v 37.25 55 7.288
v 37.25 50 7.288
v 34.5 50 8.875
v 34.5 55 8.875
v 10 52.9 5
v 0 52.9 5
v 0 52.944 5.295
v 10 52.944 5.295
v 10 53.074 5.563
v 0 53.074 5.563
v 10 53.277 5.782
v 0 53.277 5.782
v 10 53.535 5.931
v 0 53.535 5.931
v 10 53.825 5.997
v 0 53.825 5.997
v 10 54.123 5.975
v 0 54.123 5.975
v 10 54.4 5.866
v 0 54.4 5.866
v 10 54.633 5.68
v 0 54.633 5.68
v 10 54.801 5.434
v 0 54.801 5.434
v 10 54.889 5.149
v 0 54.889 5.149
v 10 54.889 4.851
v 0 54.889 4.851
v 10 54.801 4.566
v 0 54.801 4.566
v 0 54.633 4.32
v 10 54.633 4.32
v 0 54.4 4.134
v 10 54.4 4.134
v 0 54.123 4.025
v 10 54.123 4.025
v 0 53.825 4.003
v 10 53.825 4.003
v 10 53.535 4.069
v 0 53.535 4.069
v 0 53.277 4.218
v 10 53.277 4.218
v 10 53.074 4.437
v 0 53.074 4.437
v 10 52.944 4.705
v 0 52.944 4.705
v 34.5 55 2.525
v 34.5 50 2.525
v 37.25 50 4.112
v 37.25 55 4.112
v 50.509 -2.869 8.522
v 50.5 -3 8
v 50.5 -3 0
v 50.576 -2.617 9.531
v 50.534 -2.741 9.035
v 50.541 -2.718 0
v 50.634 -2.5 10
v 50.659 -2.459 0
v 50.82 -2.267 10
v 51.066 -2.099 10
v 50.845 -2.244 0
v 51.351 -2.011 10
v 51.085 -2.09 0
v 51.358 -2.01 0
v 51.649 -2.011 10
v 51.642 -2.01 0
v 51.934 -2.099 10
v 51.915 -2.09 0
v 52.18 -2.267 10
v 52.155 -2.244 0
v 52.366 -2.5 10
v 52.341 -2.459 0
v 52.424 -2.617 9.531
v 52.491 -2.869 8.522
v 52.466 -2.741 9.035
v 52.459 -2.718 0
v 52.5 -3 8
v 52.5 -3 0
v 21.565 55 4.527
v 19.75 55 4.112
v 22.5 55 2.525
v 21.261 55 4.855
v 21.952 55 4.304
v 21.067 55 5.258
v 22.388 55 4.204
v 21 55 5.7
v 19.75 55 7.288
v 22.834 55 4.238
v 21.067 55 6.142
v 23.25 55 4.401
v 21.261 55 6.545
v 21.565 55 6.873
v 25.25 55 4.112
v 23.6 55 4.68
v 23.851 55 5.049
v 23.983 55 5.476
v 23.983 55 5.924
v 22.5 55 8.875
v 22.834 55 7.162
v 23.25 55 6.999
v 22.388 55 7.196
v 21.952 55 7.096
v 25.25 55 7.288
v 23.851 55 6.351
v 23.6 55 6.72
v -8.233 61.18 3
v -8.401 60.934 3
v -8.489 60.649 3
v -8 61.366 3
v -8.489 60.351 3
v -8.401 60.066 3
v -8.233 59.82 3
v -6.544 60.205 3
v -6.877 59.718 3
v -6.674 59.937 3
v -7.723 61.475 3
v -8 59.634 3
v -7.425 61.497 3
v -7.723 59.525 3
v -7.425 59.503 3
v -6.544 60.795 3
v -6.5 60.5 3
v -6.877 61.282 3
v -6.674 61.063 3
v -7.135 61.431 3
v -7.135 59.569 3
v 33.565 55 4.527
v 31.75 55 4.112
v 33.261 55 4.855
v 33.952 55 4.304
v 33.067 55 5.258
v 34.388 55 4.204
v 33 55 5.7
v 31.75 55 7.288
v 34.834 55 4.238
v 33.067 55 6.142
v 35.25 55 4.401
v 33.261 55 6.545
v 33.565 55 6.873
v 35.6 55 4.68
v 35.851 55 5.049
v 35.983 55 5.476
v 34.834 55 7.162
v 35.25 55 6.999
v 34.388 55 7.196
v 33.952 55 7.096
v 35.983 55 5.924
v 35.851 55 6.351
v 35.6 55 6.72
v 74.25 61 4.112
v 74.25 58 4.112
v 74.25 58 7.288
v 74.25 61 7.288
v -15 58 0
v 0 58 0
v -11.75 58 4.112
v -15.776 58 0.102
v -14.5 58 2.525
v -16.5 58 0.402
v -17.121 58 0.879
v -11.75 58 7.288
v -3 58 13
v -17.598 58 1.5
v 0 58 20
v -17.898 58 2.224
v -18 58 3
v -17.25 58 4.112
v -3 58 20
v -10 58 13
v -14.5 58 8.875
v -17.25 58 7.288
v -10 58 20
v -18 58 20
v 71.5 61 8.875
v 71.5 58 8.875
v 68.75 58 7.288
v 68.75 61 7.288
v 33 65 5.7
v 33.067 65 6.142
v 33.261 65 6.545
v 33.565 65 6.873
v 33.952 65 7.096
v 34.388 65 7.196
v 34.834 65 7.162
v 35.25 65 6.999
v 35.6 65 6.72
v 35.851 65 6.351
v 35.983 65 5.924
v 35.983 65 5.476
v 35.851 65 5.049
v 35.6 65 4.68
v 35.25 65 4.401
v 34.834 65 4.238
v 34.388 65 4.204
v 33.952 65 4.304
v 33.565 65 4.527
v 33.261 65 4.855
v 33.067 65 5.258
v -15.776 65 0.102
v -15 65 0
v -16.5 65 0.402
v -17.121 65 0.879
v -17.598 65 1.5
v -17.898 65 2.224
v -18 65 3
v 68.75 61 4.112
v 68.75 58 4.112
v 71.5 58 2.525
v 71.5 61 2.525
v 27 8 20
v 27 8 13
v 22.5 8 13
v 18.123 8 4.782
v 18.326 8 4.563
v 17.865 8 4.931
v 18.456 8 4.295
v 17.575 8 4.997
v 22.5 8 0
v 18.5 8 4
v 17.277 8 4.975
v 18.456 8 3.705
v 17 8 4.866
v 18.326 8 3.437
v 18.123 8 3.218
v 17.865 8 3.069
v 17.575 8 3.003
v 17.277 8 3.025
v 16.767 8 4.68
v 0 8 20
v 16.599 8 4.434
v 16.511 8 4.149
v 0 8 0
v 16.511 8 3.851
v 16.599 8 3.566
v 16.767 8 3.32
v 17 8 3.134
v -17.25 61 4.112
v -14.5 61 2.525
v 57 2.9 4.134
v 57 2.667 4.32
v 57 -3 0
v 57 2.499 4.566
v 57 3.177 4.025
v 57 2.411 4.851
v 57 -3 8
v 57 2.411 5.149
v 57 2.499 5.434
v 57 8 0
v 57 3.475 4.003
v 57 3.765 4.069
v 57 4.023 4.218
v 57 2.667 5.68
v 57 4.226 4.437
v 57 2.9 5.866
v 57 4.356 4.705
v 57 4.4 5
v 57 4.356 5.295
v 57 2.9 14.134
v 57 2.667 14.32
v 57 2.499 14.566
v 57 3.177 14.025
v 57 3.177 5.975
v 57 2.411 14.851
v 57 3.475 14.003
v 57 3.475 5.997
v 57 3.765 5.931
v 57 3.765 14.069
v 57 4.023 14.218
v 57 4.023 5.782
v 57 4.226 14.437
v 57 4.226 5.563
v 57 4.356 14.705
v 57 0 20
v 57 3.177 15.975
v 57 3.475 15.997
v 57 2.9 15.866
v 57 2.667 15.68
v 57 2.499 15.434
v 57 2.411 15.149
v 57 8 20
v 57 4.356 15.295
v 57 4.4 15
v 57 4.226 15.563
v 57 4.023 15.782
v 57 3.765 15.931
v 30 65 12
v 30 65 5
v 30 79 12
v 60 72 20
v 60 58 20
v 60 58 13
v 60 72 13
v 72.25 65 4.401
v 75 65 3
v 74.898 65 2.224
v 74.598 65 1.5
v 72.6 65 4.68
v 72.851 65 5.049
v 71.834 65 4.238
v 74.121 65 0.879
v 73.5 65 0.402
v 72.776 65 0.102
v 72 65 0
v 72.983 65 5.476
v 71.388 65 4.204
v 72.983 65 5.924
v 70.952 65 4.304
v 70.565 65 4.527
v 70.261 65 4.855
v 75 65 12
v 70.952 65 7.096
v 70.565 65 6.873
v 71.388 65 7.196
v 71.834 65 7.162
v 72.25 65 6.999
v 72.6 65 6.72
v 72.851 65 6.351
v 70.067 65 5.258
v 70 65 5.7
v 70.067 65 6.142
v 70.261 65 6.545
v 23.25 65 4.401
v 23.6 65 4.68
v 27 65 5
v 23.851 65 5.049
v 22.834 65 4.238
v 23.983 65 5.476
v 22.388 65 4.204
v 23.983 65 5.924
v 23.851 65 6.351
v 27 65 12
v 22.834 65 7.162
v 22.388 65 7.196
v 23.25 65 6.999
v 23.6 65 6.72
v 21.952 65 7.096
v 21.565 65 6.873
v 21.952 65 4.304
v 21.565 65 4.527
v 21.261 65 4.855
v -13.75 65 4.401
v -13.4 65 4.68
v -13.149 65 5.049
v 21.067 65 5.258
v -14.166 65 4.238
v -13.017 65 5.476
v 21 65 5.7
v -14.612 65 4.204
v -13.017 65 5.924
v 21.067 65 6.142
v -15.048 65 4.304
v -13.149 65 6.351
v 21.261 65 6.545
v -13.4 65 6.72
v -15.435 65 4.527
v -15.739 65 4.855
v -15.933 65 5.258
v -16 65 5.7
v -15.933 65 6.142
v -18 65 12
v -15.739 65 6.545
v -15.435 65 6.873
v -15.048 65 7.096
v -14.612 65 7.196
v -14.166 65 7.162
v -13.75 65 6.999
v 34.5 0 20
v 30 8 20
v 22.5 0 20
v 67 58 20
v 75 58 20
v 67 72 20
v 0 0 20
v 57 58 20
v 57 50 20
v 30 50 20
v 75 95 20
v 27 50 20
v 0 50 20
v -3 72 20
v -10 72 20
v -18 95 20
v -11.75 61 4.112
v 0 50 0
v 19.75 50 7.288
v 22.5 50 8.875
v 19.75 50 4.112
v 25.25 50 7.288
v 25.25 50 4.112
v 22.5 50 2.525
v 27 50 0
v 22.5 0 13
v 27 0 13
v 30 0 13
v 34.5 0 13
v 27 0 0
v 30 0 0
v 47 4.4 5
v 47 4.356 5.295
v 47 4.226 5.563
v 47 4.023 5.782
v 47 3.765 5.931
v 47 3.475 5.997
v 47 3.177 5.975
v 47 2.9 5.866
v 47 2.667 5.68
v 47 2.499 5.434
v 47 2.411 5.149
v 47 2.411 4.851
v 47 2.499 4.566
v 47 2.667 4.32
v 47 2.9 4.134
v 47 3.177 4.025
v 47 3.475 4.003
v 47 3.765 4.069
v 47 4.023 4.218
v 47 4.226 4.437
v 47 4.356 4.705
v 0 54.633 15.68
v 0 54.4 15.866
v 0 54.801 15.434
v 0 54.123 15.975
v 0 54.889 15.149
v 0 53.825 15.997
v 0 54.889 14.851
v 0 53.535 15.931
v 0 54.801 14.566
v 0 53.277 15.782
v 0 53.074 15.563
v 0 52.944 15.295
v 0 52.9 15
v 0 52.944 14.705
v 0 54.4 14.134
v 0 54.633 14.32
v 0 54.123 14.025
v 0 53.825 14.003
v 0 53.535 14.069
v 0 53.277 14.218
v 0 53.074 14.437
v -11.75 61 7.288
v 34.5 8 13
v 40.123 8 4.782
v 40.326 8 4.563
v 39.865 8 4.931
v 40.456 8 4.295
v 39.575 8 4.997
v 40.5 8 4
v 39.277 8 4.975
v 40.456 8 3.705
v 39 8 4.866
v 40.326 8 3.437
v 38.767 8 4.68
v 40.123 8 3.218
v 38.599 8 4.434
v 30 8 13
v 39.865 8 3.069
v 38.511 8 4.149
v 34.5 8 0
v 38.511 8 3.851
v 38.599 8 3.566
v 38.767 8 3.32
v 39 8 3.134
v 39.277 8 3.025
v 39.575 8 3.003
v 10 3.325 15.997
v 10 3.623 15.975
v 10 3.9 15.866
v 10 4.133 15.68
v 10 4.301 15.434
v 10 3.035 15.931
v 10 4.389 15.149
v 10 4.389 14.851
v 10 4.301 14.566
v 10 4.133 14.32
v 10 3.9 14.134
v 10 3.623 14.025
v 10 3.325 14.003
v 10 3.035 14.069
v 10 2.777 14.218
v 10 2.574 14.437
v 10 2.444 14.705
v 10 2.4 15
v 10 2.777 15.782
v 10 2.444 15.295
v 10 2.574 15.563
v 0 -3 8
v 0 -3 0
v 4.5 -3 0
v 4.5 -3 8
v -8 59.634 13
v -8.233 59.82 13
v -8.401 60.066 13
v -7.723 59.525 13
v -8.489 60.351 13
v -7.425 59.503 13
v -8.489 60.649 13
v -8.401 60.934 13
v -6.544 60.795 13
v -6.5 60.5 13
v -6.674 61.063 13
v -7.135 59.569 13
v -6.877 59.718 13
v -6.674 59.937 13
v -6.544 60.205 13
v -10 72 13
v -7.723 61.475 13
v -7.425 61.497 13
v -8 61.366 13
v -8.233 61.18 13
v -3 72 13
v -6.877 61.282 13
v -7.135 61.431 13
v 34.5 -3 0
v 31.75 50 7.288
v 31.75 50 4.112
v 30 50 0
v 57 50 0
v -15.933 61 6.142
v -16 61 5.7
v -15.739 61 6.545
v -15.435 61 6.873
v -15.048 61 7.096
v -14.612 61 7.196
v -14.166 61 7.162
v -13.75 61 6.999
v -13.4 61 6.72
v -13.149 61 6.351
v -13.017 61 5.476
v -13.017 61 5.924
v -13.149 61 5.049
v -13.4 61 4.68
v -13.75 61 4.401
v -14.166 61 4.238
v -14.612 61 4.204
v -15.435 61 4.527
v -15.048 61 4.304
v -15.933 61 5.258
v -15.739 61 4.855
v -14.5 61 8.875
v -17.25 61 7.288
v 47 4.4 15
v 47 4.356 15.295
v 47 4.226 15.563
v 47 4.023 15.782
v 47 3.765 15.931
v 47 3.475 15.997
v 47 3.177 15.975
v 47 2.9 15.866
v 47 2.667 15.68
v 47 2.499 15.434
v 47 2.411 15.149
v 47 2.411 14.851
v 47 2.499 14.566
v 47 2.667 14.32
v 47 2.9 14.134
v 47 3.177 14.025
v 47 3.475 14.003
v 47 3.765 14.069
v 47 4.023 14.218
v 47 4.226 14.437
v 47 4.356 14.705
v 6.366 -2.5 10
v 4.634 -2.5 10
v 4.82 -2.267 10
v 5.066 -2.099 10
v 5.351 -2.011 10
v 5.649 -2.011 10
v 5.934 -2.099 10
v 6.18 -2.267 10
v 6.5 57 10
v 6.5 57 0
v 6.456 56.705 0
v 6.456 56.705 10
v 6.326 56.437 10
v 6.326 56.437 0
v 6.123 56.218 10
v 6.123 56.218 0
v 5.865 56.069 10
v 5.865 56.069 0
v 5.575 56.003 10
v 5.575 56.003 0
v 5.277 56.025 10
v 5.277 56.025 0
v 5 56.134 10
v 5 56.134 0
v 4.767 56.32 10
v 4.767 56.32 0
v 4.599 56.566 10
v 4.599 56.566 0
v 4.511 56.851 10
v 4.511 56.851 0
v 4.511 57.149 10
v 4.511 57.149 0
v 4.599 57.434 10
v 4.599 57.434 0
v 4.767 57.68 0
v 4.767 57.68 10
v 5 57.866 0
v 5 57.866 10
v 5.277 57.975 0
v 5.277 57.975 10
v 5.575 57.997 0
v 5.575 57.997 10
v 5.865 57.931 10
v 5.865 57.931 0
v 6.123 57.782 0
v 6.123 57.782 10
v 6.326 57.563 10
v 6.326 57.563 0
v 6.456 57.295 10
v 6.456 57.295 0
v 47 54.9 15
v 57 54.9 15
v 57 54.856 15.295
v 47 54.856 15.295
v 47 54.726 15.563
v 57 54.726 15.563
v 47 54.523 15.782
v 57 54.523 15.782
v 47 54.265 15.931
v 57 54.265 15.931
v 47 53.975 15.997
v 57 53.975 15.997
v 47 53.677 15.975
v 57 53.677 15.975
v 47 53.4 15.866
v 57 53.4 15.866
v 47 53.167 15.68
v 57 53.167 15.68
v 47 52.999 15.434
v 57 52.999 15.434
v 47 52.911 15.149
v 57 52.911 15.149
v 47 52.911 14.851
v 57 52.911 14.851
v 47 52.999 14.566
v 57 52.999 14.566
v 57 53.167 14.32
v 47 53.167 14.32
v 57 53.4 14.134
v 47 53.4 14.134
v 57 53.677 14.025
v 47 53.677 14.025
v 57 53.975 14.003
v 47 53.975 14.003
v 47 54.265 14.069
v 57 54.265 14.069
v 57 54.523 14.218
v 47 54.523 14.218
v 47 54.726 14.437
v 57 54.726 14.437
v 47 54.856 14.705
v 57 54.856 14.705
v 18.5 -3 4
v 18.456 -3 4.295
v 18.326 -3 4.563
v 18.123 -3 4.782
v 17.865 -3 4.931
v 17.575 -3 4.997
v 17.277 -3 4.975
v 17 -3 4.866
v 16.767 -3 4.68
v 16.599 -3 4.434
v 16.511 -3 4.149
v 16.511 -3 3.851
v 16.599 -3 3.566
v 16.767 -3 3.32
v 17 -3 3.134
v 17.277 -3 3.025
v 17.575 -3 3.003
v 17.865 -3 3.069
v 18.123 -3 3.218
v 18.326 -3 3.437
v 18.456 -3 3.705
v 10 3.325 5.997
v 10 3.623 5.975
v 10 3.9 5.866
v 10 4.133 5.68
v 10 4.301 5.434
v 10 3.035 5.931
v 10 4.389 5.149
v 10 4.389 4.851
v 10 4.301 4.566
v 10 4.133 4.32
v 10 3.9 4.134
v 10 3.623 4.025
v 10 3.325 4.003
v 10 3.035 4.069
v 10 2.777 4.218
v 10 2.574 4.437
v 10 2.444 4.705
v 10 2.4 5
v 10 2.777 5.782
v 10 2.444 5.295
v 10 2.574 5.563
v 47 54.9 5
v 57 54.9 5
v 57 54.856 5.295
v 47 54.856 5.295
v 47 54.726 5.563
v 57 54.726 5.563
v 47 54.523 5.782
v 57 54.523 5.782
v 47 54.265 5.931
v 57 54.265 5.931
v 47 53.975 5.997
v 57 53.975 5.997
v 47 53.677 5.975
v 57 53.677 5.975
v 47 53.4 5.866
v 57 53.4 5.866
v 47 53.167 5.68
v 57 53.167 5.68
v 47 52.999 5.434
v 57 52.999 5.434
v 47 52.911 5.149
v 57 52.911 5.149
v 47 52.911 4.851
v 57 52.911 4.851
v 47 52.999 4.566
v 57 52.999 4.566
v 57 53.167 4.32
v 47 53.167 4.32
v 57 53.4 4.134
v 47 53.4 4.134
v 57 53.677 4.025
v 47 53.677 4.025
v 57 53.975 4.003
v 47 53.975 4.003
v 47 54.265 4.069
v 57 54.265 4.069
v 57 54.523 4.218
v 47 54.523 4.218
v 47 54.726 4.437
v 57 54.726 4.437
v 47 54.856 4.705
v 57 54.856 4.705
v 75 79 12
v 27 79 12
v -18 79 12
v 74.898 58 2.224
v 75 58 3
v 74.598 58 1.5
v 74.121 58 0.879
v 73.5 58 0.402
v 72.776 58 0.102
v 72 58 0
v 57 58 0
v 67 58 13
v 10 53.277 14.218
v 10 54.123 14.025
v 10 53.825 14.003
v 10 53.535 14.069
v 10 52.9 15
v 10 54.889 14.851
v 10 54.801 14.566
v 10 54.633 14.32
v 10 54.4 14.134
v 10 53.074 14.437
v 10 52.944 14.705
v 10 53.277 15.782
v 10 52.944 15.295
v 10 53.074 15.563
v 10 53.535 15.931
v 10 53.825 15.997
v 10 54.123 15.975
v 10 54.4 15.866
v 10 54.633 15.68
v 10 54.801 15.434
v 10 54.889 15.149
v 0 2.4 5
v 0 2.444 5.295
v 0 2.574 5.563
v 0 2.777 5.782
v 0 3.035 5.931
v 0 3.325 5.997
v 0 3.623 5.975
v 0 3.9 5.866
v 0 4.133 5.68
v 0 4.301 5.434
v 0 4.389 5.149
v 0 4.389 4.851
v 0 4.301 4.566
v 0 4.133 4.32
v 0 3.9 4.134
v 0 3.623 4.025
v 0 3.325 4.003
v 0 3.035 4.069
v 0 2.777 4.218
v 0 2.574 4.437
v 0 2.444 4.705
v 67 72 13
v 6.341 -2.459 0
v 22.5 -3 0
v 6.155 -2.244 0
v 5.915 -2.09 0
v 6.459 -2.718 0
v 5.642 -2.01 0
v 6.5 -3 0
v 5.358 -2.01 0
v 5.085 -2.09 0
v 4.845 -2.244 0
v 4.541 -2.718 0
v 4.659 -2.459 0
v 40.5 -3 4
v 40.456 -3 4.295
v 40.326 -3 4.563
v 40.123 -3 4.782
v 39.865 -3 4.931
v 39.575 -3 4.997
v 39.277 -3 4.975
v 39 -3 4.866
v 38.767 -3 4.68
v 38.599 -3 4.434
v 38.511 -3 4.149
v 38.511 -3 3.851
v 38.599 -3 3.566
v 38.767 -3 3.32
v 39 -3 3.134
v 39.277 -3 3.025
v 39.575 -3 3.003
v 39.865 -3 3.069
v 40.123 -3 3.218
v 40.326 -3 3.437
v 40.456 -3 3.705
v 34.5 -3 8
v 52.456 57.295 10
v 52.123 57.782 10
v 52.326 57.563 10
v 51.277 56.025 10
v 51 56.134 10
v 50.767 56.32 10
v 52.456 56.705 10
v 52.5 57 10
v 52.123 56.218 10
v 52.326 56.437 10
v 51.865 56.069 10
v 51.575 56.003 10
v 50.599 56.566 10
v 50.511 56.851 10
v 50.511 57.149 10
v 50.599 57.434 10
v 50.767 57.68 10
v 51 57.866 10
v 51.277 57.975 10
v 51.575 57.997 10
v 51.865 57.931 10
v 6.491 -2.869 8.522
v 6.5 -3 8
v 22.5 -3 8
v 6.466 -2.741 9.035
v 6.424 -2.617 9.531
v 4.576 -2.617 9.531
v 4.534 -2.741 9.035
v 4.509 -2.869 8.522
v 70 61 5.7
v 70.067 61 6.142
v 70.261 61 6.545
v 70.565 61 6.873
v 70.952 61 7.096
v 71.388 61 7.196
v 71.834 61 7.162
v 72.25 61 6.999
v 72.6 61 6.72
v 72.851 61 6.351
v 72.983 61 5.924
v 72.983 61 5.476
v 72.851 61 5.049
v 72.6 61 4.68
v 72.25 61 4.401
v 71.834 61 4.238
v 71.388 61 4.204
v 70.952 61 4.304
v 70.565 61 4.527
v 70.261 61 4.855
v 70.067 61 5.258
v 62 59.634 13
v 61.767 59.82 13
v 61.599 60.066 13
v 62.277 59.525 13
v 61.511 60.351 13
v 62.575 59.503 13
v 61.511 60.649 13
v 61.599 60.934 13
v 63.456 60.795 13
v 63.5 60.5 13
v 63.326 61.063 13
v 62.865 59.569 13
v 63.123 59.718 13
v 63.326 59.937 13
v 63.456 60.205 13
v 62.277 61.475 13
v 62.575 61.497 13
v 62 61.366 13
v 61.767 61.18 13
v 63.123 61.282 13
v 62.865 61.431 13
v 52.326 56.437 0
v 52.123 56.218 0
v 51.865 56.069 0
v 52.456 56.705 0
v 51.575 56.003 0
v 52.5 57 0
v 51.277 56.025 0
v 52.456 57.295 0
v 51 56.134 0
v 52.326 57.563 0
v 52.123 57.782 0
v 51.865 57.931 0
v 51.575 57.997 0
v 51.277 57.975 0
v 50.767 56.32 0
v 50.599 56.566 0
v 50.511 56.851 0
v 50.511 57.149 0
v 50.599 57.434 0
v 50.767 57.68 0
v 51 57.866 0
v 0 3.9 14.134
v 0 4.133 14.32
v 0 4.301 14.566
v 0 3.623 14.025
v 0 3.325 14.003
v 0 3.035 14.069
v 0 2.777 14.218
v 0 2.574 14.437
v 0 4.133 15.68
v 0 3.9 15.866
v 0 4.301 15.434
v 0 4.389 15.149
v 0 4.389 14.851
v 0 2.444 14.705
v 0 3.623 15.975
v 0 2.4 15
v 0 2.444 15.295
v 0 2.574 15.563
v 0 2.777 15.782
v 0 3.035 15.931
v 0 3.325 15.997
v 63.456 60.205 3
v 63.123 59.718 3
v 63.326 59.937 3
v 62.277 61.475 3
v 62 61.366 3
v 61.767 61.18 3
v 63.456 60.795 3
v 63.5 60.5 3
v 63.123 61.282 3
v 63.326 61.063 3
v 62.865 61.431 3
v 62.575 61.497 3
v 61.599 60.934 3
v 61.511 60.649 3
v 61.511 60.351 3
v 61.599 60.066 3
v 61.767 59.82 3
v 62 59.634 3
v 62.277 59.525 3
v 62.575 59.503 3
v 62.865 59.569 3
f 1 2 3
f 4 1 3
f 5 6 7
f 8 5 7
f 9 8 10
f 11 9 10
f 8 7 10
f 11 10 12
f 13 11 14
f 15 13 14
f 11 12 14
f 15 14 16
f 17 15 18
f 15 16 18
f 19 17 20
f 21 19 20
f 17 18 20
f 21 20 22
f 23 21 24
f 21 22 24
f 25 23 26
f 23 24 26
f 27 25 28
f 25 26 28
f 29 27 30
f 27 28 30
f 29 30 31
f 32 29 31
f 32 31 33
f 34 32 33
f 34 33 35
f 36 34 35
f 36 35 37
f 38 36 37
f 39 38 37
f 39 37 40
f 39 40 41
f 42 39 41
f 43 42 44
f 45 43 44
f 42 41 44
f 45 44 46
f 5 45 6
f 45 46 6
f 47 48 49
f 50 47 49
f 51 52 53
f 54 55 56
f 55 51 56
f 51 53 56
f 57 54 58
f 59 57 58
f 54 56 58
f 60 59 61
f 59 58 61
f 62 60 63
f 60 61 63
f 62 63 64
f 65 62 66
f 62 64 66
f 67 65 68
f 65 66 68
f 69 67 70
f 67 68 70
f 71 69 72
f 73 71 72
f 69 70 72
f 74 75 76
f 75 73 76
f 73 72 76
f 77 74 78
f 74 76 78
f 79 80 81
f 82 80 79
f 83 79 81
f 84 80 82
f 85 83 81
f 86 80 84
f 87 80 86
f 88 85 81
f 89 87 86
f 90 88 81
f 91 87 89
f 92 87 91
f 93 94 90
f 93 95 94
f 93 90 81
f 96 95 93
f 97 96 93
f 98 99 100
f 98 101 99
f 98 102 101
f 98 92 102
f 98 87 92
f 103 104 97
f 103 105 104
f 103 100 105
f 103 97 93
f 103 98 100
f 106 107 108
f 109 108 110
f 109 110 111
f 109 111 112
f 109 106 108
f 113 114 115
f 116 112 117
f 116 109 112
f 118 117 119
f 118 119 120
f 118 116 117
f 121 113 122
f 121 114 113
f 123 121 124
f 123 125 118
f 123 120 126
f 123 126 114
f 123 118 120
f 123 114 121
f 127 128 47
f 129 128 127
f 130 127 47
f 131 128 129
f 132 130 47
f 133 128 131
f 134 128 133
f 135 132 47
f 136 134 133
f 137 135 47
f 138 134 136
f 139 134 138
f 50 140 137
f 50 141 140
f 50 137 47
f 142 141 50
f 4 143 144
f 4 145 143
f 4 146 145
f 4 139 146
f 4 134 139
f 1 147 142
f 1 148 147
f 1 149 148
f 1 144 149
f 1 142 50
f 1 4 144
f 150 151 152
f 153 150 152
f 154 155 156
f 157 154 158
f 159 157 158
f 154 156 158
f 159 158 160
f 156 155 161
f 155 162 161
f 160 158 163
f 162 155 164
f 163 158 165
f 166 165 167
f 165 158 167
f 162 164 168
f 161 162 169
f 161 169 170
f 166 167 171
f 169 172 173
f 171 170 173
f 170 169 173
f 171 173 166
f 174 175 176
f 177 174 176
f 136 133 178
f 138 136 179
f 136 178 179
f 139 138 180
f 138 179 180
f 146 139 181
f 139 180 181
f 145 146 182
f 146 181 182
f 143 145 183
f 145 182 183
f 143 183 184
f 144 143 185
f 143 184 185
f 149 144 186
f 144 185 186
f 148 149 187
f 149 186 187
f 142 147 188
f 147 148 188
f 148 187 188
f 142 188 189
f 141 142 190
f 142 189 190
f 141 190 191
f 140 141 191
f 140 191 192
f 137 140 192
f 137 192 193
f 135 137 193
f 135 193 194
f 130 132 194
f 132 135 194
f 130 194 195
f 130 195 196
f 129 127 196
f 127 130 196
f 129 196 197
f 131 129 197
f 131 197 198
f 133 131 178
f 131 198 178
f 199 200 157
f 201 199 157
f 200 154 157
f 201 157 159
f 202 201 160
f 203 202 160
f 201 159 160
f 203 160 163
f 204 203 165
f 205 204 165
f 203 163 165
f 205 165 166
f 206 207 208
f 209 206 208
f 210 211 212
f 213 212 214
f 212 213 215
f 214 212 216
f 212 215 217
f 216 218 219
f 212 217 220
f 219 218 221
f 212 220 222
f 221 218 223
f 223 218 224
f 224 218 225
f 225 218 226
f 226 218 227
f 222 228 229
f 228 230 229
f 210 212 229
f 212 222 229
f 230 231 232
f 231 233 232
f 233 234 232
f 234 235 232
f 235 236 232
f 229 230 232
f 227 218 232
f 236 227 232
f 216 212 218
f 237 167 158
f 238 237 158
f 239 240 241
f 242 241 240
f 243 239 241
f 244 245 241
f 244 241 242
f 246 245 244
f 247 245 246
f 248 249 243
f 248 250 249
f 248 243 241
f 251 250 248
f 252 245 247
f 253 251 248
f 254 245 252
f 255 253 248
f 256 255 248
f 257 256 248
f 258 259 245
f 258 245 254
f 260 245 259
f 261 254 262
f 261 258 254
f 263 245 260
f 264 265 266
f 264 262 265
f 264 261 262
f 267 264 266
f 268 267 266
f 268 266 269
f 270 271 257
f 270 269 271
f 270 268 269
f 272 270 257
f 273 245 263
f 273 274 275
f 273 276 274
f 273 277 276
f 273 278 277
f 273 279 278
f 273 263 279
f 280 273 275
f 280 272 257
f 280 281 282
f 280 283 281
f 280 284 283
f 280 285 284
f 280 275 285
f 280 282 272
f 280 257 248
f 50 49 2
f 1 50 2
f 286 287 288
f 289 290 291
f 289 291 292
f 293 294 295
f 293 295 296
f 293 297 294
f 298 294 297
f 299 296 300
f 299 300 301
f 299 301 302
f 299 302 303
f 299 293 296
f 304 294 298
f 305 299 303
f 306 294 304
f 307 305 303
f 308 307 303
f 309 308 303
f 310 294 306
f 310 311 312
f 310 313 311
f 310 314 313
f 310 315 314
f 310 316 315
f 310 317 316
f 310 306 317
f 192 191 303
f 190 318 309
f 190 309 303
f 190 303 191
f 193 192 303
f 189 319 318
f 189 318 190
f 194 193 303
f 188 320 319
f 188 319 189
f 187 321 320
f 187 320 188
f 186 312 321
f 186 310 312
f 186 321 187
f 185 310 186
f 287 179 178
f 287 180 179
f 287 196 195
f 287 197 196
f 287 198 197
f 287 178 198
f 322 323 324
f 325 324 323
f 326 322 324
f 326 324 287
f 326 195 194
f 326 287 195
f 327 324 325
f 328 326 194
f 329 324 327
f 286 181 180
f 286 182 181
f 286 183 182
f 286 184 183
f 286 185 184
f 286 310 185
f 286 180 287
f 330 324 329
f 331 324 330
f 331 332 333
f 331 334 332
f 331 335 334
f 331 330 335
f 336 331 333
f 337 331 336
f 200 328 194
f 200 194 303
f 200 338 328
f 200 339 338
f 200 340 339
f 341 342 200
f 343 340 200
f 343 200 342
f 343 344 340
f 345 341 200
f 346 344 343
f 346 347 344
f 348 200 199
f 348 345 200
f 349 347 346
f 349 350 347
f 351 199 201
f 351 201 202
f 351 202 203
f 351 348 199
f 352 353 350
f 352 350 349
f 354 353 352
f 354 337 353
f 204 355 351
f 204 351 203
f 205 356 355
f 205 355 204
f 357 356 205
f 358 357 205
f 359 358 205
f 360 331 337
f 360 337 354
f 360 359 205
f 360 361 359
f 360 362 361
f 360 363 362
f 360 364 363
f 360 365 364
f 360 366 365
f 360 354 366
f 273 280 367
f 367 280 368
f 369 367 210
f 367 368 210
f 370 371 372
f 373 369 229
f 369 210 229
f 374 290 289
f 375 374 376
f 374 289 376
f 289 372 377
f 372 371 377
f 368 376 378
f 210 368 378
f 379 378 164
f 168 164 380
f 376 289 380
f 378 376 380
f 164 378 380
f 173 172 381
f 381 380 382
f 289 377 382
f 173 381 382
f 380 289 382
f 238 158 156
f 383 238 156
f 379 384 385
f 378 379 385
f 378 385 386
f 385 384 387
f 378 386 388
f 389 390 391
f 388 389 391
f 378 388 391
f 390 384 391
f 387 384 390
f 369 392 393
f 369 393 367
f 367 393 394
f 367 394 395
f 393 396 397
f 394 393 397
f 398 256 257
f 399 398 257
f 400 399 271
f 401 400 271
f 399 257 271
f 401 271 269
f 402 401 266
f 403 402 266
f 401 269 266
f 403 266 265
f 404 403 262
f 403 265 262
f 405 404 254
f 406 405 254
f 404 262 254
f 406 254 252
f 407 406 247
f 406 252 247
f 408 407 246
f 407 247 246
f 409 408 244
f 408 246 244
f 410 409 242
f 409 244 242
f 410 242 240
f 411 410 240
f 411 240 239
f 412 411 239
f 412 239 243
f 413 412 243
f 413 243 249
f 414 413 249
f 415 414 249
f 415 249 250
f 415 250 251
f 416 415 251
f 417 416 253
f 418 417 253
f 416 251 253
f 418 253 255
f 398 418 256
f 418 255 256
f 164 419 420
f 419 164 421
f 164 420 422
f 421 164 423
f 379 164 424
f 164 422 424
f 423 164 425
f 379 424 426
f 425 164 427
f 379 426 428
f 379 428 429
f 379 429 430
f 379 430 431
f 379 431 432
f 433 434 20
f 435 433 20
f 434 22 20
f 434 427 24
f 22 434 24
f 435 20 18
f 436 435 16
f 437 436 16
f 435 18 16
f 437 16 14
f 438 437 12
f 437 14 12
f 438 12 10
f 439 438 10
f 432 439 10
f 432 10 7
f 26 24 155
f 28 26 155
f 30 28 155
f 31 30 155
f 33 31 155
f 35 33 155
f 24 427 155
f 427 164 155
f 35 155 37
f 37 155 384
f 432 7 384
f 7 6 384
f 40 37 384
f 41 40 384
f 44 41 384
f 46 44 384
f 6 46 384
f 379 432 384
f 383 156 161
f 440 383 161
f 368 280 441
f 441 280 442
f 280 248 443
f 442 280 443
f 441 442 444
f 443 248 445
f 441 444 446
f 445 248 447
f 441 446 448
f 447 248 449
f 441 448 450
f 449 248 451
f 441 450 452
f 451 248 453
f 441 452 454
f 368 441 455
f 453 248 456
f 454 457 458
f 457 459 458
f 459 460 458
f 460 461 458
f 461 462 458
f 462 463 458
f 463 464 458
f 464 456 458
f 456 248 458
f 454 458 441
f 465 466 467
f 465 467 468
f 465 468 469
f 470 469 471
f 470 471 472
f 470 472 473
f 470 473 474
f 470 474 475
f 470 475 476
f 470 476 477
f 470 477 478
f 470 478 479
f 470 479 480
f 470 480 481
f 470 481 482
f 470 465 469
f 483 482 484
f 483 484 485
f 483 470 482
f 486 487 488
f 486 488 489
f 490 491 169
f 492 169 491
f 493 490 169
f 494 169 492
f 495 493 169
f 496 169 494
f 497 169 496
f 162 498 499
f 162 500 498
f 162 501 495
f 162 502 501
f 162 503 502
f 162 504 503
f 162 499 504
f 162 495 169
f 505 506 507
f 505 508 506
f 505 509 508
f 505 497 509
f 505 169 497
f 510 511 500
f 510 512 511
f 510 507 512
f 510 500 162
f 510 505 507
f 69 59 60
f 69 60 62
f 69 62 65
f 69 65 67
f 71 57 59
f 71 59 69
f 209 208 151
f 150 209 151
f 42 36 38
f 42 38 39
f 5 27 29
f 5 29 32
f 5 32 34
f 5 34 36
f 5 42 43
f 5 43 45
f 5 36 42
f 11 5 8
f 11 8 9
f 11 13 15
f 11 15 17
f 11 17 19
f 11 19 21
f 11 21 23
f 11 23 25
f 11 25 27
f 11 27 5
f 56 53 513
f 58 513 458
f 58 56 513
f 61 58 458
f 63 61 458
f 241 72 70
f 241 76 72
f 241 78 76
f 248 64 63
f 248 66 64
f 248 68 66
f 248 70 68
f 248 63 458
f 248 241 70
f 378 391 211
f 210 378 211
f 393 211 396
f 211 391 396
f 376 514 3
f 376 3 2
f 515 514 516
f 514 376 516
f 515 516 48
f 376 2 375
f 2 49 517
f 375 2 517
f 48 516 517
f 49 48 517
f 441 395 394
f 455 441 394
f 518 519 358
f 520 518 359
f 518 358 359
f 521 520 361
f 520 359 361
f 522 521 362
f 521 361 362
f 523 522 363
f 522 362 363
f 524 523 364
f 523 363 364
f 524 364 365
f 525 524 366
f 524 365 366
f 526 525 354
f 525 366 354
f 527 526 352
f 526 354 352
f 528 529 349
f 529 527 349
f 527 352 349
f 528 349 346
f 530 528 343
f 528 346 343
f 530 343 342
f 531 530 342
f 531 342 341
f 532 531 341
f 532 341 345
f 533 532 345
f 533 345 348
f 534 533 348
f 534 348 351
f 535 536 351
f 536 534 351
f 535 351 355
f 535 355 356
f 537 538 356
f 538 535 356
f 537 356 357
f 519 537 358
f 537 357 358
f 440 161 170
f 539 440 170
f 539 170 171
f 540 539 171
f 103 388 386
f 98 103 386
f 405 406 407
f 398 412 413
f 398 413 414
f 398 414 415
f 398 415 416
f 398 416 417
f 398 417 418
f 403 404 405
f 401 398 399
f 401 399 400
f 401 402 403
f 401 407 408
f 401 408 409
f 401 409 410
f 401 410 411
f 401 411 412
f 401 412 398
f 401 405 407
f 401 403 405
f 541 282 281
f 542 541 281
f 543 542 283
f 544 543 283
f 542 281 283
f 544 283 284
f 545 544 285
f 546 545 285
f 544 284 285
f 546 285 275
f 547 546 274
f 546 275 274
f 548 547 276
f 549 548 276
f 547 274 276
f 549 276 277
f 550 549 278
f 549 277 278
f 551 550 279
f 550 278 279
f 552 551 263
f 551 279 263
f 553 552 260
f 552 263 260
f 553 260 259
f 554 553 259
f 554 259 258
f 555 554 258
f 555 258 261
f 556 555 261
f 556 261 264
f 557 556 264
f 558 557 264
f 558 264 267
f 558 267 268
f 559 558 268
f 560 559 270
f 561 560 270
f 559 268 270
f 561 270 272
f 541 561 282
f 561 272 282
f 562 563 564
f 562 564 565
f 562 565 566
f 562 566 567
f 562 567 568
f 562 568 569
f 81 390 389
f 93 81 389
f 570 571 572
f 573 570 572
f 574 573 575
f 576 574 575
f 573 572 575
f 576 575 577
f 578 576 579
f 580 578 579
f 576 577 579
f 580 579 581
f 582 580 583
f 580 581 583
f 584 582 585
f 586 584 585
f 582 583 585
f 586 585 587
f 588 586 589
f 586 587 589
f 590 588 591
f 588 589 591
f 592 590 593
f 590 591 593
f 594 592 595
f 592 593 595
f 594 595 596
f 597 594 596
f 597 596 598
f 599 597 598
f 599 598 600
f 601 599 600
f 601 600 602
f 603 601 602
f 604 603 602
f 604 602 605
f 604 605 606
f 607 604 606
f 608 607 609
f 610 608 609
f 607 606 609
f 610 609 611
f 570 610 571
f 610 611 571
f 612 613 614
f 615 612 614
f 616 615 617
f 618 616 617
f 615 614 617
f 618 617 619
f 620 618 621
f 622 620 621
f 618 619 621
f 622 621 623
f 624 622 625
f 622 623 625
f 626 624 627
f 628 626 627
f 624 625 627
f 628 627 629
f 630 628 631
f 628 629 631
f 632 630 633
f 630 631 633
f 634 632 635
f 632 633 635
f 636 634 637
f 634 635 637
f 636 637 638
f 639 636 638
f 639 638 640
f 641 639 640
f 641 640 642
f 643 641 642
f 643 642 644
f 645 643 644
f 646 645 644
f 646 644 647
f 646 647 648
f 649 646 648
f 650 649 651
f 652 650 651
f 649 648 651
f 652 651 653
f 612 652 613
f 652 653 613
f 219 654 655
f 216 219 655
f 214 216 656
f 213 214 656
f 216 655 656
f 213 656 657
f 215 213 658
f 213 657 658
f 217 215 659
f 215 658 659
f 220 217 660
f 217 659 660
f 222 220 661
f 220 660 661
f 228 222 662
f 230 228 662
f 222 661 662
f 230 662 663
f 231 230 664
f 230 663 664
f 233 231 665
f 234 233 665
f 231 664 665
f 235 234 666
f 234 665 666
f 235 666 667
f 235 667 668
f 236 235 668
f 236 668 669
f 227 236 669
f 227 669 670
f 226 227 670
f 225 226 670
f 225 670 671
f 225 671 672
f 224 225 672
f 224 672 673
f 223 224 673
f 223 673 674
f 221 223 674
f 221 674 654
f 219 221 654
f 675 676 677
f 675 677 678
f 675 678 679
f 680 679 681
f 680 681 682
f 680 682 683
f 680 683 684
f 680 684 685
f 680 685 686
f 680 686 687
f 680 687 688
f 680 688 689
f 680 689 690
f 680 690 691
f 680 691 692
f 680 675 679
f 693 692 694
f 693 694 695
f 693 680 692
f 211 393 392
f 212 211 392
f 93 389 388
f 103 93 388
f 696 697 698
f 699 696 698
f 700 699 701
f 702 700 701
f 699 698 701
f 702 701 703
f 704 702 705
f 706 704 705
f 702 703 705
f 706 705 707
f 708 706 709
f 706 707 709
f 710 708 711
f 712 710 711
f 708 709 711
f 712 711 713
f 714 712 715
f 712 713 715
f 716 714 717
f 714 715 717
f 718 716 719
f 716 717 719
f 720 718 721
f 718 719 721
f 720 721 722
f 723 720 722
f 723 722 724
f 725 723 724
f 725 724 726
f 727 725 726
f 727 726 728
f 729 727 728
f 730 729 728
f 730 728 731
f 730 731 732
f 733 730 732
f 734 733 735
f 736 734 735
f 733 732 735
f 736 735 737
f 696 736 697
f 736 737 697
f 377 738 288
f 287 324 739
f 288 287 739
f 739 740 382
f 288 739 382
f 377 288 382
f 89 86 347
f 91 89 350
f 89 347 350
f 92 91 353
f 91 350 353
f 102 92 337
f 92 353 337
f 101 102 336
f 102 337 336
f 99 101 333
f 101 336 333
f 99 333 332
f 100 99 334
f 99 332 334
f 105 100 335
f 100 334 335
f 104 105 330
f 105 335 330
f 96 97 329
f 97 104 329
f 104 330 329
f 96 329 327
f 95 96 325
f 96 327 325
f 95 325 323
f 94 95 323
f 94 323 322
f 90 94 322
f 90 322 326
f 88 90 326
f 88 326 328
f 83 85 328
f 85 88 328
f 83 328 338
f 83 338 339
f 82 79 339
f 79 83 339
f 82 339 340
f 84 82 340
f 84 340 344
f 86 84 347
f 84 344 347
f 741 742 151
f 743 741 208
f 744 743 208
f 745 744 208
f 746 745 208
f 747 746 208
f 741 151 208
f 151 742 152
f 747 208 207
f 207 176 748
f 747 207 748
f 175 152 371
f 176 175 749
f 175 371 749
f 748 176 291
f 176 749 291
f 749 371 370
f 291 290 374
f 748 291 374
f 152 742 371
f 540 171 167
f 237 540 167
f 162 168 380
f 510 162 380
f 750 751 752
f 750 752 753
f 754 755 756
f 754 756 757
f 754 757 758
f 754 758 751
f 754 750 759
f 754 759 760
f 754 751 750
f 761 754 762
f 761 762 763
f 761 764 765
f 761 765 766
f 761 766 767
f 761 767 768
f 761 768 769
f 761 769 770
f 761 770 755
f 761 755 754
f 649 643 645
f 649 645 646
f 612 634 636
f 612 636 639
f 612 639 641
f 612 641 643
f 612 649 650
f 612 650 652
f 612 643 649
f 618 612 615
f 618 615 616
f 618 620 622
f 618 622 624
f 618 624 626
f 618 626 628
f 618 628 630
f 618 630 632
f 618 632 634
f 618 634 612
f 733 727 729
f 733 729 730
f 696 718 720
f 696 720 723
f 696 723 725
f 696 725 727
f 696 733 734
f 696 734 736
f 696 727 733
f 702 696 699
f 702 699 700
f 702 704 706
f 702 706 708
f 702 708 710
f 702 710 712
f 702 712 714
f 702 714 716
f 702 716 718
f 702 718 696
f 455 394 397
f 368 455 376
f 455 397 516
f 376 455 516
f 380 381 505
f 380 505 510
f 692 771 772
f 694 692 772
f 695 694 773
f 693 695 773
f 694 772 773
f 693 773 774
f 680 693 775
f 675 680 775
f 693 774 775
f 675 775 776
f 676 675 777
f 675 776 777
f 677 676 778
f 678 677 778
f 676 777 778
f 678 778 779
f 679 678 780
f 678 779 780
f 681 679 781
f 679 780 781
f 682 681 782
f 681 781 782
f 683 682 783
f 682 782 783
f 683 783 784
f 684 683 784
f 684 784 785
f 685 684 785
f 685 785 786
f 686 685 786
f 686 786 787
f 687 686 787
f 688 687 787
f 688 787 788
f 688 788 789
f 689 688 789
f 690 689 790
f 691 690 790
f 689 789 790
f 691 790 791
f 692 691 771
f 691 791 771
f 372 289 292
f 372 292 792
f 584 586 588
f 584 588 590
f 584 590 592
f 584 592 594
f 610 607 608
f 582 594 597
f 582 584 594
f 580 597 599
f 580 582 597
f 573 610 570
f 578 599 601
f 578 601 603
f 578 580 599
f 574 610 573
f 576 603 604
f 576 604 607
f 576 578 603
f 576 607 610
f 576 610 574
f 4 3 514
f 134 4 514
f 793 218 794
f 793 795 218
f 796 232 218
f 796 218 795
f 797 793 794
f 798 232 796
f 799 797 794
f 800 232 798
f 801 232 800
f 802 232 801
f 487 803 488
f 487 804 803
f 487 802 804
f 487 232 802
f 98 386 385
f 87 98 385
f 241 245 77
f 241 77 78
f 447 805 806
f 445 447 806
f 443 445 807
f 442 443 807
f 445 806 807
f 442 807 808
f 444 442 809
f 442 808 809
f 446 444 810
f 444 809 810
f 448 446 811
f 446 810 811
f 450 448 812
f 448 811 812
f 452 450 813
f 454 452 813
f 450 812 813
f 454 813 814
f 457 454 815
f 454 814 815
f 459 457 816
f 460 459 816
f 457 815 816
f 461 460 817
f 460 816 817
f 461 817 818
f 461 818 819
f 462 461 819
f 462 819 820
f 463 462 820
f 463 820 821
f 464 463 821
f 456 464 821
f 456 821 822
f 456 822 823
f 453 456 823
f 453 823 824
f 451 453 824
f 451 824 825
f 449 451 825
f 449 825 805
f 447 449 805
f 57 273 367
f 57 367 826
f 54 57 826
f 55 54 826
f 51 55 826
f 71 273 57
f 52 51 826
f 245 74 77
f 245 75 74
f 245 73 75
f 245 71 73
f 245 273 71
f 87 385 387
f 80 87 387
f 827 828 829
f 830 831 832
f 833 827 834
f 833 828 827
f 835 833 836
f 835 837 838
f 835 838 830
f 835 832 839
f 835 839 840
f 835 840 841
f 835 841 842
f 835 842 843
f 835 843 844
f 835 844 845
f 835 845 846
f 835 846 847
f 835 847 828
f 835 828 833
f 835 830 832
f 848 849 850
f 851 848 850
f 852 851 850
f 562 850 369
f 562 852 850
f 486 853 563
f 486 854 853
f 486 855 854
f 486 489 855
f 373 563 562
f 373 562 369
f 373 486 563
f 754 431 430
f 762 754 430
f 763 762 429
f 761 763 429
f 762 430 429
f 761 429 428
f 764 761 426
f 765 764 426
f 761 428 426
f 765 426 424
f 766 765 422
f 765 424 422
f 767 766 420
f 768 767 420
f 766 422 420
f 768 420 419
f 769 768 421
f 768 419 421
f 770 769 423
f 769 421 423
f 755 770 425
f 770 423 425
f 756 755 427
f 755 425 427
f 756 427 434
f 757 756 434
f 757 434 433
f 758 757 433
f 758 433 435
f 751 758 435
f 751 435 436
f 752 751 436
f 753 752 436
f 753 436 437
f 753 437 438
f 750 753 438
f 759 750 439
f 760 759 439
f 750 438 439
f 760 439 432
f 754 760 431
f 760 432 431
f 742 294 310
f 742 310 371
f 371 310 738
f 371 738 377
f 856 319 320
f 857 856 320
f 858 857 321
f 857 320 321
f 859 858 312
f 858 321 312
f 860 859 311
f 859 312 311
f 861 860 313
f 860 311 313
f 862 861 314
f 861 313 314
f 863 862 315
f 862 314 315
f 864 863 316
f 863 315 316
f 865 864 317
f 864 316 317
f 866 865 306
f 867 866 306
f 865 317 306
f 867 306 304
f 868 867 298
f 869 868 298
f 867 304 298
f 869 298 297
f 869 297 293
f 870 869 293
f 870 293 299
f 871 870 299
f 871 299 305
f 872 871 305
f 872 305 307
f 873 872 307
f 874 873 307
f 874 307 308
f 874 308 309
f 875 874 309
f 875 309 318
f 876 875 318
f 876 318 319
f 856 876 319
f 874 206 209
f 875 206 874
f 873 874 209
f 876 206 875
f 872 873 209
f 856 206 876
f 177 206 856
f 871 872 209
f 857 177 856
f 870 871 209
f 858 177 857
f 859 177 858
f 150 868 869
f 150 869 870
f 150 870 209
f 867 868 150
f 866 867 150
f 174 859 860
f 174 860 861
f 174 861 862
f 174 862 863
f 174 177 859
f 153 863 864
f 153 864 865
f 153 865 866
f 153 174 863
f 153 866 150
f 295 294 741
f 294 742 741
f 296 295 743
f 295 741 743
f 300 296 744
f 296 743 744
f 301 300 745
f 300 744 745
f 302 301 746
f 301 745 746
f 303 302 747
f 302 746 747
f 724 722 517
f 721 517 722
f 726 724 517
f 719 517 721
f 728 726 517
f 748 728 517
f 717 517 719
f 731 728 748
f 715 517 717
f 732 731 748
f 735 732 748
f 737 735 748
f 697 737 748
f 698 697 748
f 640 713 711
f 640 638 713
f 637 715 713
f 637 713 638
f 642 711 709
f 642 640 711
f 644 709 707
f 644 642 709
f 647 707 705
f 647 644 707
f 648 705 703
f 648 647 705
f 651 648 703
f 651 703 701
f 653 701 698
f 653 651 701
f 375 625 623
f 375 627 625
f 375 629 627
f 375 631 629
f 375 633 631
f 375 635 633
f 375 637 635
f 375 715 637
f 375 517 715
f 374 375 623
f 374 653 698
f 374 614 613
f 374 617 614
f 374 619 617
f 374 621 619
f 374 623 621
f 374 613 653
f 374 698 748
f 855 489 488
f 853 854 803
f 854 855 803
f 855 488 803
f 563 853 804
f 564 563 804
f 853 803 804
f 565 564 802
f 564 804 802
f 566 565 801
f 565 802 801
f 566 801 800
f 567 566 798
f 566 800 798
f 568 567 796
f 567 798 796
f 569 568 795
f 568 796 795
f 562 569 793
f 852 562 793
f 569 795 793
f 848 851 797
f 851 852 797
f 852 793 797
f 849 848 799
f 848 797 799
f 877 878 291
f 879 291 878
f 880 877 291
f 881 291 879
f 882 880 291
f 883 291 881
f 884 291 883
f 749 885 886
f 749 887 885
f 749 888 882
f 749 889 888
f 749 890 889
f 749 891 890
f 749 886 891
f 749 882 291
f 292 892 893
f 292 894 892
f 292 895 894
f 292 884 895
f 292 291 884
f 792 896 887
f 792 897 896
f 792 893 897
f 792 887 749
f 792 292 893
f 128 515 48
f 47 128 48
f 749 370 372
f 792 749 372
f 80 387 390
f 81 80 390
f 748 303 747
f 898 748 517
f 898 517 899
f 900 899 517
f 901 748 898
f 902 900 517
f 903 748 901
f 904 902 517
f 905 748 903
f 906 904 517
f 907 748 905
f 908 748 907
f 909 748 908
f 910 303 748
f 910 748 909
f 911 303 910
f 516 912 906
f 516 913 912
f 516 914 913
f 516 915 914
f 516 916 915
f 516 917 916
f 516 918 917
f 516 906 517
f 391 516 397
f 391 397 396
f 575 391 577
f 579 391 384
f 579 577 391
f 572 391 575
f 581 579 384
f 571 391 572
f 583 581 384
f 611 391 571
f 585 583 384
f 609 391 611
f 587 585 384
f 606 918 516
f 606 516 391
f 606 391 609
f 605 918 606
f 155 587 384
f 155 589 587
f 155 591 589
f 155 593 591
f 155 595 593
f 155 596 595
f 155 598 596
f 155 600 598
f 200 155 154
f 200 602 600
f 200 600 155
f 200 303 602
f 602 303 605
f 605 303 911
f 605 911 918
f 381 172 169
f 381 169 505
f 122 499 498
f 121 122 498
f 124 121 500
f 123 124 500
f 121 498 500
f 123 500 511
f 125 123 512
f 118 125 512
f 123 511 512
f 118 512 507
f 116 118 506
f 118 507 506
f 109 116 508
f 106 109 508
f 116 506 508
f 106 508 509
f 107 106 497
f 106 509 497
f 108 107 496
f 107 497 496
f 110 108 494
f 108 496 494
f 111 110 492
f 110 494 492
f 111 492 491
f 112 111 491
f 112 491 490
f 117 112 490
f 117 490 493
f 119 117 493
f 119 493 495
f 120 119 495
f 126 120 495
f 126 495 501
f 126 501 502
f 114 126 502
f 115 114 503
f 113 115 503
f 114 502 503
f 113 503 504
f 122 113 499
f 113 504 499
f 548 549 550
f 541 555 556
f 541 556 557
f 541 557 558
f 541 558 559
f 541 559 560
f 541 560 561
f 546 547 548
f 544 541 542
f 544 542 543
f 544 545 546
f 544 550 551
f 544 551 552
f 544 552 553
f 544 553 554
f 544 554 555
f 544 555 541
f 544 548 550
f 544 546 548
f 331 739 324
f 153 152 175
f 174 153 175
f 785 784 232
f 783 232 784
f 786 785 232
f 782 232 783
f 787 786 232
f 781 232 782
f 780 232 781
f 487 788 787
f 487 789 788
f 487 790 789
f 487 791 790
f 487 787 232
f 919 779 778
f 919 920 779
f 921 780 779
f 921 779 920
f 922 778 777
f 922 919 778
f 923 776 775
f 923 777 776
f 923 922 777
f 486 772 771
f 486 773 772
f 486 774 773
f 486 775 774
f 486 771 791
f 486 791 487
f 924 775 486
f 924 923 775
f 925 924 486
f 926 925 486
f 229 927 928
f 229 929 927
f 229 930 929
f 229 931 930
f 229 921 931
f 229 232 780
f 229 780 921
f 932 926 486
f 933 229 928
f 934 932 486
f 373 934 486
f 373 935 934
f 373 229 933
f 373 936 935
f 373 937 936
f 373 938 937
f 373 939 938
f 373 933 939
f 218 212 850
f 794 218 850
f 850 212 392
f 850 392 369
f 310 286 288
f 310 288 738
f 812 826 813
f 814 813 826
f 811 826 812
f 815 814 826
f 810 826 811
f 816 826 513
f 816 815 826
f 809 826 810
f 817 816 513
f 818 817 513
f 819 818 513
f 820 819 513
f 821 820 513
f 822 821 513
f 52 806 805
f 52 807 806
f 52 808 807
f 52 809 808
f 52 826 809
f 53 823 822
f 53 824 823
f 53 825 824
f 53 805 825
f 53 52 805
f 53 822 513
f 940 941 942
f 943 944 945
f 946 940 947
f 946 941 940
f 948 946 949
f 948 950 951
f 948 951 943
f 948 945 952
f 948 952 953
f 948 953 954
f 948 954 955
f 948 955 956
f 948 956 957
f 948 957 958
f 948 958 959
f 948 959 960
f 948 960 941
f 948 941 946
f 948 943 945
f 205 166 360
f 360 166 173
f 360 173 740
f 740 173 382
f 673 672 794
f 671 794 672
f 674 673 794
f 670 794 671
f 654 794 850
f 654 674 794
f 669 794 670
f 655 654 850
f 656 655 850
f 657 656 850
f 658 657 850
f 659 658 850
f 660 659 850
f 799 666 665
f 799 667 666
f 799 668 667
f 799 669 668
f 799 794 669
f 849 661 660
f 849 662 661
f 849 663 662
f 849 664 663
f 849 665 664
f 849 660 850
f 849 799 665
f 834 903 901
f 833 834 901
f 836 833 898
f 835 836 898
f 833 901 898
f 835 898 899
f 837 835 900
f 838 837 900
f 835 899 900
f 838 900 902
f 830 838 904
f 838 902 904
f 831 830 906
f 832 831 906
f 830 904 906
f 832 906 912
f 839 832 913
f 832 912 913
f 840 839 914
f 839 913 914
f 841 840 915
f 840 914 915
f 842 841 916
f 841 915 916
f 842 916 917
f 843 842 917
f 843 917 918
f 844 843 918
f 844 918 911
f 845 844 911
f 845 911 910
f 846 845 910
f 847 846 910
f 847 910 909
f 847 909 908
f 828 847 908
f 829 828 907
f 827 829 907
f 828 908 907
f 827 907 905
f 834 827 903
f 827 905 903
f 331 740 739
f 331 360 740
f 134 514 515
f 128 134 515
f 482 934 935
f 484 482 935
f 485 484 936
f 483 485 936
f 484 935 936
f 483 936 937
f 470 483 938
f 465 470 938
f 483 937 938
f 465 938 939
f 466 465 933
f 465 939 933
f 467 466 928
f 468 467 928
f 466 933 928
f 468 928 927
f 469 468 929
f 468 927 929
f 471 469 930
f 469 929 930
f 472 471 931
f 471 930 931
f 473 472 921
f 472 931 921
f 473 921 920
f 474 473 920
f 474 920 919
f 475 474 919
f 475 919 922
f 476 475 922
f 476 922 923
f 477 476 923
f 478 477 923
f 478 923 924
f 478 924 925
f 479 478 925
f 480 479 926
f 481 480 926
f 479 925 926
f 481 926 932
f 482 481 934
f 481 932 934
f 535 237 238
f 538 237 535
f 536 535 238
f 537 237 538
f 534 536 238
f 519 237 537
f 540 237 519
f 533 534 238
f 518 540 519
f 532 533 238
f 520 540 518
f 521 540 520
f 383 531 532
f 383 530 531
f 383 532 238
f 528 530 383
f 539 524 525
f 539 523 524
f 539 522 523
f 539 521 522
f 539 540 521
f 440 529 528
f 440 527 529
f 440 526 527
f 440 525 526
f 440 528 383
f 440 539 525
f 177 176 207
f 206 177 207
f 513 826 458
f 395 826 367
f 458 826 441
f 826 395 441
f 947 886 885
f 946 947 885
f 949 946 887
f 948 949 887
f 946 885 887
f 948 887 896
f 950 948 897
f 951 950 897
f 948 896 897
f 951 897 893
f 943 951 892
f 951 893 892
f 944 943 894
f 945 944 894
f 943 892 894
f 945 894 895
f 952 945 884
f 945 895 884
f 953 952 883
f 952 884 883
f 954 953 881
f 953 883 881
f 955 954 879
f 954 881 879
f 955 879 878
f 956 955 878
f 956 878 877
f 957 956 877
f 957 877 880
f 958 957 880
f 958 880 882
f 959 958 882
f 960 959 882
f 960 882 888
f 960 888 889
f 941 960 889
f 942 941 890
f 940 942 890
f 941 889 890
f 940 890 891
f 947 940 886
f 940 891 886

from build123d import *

# Parameters (mm, degrees)
F1_DEPTH      = 20
F2_R          = 1
F3_DEPTH      = 10
F4_R          = 1
F5_DEPTH      = 10
F7_DEPTH      = 75
F7_DEPTH_BACK = -18
F9_DEPTH      = 12
F11_DEPTH     = 12
F12_W         = 18
F12_H         = 20
F13_DEPTH     = 7
F14_R         = 1.5
F15_DEPTH     = 25
F16_R         = 3
F18_DEPTH     = 22.5
F20_DEPTH     = 22.5
F21_R         = 1
F22_DEPTH     = 10
F23_W         = 7
F23_H         = 14
F24_DEPTH     = 7
F25_R         = 1
F26_DEPTH     = 25
F27_R         = 1
F28_DEPTH     = 10
F29_R         = 1.5
F30_R         = 1.5
F33_DEPTH     = 5
F32_R         = 1.5
F34_DEPTH     = 3


with BuildPart() as f1:
    # F0 (on Top) → F1 (new body)
    with BuildSketch(Plane.XY):
        Polygon((0, 8), (0, 0), (57, 0), (57, 8), (30, 8), (30, 50), (57, 50), (57, 65), (0, 65), (0, 50), (27, 50), (27, 8), align=None)
    extrude(amount=F1_DEPTH)

    # F2 (on face) → F3 (cut)
    with BuildSketch(Plane.YZ.offset(57)):
        with Locations((3.4, 15)):
            Circle(F2_R)
        with Locations((3.4, 5)):
            Circle(F2_R)
        with Locations((53.9, 15)):
            Circle(F2_R)
        with Locations((53.9, 5)):
            Circle(F2_R)
    extrude(amount=-F3_DEPTH, mode=Mode.SUBTRACT)

    # F4 (on face) → F5 (cut)
    with BuildSketch(Plane(origin=(0, 0, 0), x_dir=(0, -1, 0), z_dir=(-1, 0, 0))):
        with Locations((-53.9, 15)):
            Circle(F4_R)
        with Locations((-53.9, 5)):
            Circle(F4_R)
        with Locations((-3.4, 15)):
            Circle(F4_R)
        with Locations((-3.4, 5)):
            Circle(F4_R)
    extrude(amount=-F5_DEPTH, mode=Mode.SUBTRACT)

    # F6 (on face) → F7 (join, two sides)
    with BuildSketch(Plane.YZ.offset(57)) as f7_sk:
        Polygon((65, 20), (65, 5), (95, 20), align=None)
    extrude(amount=-F7_DEPTH)
    extrude(f7_sk.sketch, amount=-F7_DEPTH_BACK)

    # F8 (on face) → F9 (cut)
    with BuildSketch(Plane.XZ):
        Polygon((27, 0), (27, 13), (22.5, 13), (22.5, 7), (22.5, 0), align=None)
        Polygon((30, 13), (30, 0), (34.5, 0), (34.5, 7), (34.5, 13), align=None)
    extrude(amount=-F9_DEPTH, mode=Mode.SUBTRACT)

    # F10 (on face) → F11 (cut)
    with BuildSketch(Plane(origin=(0, 0, 0), x_dir=(1, 0, 0), z_dir=(0, 0, -1))):
        Polygon((27, -105), (27, -65), (0, -65), (-23, -65), (-23, -105), align=None)
        Polygon((57, -65), (30, -65), (30, -105), (80, -105), (80, -65), align=None)
    extrude(amount=-F11_DEPTH, mode=Mode.SUBTRACT)

    # F12 (on face) → F13 (join)
    with BuildSketch(Plane(origin=(0, 65, 0), x_dir=(-1, 0, 0), z_dir=(0, 1, 0))):
        with Locations((-66, 10)):
            Rectangle(F12_W, F12_H)
        with Locations((9, 10)):
            Rectangle(F12_W, F12_H)
    extrude(amount=-F13_DEPTH)

    # F14 (on face) → F15 (cut)
    with BuildSketch(Plane(origin=(0, 65, 0), x_dir=(-1, 0, 0), z_dir=(0, 1, 0))):
        with Locations((-71.5, 5.7)):
            Circle(F14_R)
        with Locations((-34.5, 5.7)):
            Circle(F14_R)
        with Locations((-22.5, 5.7)):
            Circle(F14_R)
        with Locations((14.5, 5.7)):
            Circle(F14_R)
    extrude(amount=-F15_DEPTH, mode=Mode.SUBTRACT)

    # F16
    f16_edges = [f1.edges().sort_by_distance(p)[0] for p in [
        (75, 61.5, 0),
        (-18, 61.5, 0),
    ]]
    fillet(f16_edges, radius=F16_R)

    # F17 (on face) → F18 (join, through all)
    with BuildSketch(Plane.YZ.offset(57)):
        Polygon((-3, 8), (-3, 0), (0, 0), (0, 20), align=None)
    extrude(amount=-F18_DEPTH)

    # F19 (on face) → F20 (join, through all)
    with BuildSketch(Plane(origin=(0, 0, 0), x_dir=(0, -1, 0), z_dir=(-1, 0, 0))):
        Polygon((0, 0), (3, 0), (3, 8), (0, 20), align=None)
    extrude(amount=-F20_DEPTH)

    # F21 (on face) → F22 (cut)
    with BuildSketch(Plane(origin=(0, 0, 0), x_dir=(1, 0, 0), z_dir=(0, 0, -1))):
        with Locations((5.5, -57)):
            Circle(F21_R)
        with Locations((5.5, 3)):
            Circle(F21_R)
        with Locations((51.5, 3)):
            Circle(F21_R)
        with Locations((51.5, -57)):
            Circle(F21_R)
    extrude(amount=-F22_DEPTH, mode=Mode.SUBTRACT)

    # F23 (on face) → F24 (cut)
    with BuildSketch(Plane.XY.offset(20)):
        with Locations((-6.5, 65)):
            Rectangle(F23_W, F23_H)
        with Locations((63.5, 65)):
            Rectangle(F23_W, F23_H)
    extrude(amount=-F24_DEPTH, mode=Mode.SUBTRACT)

    # F25 (on face) → F26 (cut)
    with BuildSketch(Plane.XZ.offset(3)):
        with Locations((17.5, 4)):
            Circle(F25_R)
        with Locations((39.5, 4)):
            Circle(F25_R)
    extrude(amount=-F26_DEPTH, mode=Mode.SUBTRACT)

    # F27 (on face) → F28 (cut)
    with BuildSketch(Plane.XY.offset(13)):
        with Locations((-7.5, 60.5)):
            Circle(F27_R)
        with Locations((62.5, 60.5)):
            Circle(F27_R)
    extrude(amount=-F28_DEPTH, mode=Mode.SUBTRACT)

    # F29 (on face) + F30 (on face) → F33 (cut)
    with BuildSketch(Plane.XZ.offset(-50)):
        Polygon((34.5, 2.524574), (37.25, 4.112287), (37.25, 7.287713), (34.5, 8.875426), (31.75, 7.287713), (31.75, 4.112287), align=None)
        with Locations((34.5, 5.7)):
            Circle(F29_R, mode=Mode.SUBTRACT)
    with BuildSketch(Plane.XZ.offset(-50)):
        Polygon((19.75, 7.287713), (19.75, 4.112287), (22.5, 2.524574), (25.25, 4.112287), (25.25, 7.287713), (22.5, 8.875426), align=None)
        with Locations((22.5, 5.7)):
            Circle(F30_R, mode=Mode.SUBTRACT)
    extrude(amount=-F33_DEPTH, mode=Mode.SUBTRACT)

    # F31 (on face) + F32 (on face) → F34 (cut)
    with BuildSketch(Plane.XZ.offset(-58)):
        Polygon((71.5, 8.875426), (68.75, 7.287713), (68.75, 4.112287), (71.5, 2.524574), (74.25, 4.112287), (74.25, 7.287713), align=None)
    with BuildSketch(Plane.XZ.offset(-58)):
        Polygon((-11.75, 4.112287), (-11.75, 7.287713), (-14.5, 8.875426), (-17.25, 7.287713), (-17.25, 4.112287), (-14.5, 2.524574), align=None)
        with Locations((-14.5, 5.7)):
            Circle(F32_R, mode=Mode.SUBTRACT)
    extrude(amount=-F34_DEPTH, mode=Mode.SUBTRACT)


solid = f1.part
